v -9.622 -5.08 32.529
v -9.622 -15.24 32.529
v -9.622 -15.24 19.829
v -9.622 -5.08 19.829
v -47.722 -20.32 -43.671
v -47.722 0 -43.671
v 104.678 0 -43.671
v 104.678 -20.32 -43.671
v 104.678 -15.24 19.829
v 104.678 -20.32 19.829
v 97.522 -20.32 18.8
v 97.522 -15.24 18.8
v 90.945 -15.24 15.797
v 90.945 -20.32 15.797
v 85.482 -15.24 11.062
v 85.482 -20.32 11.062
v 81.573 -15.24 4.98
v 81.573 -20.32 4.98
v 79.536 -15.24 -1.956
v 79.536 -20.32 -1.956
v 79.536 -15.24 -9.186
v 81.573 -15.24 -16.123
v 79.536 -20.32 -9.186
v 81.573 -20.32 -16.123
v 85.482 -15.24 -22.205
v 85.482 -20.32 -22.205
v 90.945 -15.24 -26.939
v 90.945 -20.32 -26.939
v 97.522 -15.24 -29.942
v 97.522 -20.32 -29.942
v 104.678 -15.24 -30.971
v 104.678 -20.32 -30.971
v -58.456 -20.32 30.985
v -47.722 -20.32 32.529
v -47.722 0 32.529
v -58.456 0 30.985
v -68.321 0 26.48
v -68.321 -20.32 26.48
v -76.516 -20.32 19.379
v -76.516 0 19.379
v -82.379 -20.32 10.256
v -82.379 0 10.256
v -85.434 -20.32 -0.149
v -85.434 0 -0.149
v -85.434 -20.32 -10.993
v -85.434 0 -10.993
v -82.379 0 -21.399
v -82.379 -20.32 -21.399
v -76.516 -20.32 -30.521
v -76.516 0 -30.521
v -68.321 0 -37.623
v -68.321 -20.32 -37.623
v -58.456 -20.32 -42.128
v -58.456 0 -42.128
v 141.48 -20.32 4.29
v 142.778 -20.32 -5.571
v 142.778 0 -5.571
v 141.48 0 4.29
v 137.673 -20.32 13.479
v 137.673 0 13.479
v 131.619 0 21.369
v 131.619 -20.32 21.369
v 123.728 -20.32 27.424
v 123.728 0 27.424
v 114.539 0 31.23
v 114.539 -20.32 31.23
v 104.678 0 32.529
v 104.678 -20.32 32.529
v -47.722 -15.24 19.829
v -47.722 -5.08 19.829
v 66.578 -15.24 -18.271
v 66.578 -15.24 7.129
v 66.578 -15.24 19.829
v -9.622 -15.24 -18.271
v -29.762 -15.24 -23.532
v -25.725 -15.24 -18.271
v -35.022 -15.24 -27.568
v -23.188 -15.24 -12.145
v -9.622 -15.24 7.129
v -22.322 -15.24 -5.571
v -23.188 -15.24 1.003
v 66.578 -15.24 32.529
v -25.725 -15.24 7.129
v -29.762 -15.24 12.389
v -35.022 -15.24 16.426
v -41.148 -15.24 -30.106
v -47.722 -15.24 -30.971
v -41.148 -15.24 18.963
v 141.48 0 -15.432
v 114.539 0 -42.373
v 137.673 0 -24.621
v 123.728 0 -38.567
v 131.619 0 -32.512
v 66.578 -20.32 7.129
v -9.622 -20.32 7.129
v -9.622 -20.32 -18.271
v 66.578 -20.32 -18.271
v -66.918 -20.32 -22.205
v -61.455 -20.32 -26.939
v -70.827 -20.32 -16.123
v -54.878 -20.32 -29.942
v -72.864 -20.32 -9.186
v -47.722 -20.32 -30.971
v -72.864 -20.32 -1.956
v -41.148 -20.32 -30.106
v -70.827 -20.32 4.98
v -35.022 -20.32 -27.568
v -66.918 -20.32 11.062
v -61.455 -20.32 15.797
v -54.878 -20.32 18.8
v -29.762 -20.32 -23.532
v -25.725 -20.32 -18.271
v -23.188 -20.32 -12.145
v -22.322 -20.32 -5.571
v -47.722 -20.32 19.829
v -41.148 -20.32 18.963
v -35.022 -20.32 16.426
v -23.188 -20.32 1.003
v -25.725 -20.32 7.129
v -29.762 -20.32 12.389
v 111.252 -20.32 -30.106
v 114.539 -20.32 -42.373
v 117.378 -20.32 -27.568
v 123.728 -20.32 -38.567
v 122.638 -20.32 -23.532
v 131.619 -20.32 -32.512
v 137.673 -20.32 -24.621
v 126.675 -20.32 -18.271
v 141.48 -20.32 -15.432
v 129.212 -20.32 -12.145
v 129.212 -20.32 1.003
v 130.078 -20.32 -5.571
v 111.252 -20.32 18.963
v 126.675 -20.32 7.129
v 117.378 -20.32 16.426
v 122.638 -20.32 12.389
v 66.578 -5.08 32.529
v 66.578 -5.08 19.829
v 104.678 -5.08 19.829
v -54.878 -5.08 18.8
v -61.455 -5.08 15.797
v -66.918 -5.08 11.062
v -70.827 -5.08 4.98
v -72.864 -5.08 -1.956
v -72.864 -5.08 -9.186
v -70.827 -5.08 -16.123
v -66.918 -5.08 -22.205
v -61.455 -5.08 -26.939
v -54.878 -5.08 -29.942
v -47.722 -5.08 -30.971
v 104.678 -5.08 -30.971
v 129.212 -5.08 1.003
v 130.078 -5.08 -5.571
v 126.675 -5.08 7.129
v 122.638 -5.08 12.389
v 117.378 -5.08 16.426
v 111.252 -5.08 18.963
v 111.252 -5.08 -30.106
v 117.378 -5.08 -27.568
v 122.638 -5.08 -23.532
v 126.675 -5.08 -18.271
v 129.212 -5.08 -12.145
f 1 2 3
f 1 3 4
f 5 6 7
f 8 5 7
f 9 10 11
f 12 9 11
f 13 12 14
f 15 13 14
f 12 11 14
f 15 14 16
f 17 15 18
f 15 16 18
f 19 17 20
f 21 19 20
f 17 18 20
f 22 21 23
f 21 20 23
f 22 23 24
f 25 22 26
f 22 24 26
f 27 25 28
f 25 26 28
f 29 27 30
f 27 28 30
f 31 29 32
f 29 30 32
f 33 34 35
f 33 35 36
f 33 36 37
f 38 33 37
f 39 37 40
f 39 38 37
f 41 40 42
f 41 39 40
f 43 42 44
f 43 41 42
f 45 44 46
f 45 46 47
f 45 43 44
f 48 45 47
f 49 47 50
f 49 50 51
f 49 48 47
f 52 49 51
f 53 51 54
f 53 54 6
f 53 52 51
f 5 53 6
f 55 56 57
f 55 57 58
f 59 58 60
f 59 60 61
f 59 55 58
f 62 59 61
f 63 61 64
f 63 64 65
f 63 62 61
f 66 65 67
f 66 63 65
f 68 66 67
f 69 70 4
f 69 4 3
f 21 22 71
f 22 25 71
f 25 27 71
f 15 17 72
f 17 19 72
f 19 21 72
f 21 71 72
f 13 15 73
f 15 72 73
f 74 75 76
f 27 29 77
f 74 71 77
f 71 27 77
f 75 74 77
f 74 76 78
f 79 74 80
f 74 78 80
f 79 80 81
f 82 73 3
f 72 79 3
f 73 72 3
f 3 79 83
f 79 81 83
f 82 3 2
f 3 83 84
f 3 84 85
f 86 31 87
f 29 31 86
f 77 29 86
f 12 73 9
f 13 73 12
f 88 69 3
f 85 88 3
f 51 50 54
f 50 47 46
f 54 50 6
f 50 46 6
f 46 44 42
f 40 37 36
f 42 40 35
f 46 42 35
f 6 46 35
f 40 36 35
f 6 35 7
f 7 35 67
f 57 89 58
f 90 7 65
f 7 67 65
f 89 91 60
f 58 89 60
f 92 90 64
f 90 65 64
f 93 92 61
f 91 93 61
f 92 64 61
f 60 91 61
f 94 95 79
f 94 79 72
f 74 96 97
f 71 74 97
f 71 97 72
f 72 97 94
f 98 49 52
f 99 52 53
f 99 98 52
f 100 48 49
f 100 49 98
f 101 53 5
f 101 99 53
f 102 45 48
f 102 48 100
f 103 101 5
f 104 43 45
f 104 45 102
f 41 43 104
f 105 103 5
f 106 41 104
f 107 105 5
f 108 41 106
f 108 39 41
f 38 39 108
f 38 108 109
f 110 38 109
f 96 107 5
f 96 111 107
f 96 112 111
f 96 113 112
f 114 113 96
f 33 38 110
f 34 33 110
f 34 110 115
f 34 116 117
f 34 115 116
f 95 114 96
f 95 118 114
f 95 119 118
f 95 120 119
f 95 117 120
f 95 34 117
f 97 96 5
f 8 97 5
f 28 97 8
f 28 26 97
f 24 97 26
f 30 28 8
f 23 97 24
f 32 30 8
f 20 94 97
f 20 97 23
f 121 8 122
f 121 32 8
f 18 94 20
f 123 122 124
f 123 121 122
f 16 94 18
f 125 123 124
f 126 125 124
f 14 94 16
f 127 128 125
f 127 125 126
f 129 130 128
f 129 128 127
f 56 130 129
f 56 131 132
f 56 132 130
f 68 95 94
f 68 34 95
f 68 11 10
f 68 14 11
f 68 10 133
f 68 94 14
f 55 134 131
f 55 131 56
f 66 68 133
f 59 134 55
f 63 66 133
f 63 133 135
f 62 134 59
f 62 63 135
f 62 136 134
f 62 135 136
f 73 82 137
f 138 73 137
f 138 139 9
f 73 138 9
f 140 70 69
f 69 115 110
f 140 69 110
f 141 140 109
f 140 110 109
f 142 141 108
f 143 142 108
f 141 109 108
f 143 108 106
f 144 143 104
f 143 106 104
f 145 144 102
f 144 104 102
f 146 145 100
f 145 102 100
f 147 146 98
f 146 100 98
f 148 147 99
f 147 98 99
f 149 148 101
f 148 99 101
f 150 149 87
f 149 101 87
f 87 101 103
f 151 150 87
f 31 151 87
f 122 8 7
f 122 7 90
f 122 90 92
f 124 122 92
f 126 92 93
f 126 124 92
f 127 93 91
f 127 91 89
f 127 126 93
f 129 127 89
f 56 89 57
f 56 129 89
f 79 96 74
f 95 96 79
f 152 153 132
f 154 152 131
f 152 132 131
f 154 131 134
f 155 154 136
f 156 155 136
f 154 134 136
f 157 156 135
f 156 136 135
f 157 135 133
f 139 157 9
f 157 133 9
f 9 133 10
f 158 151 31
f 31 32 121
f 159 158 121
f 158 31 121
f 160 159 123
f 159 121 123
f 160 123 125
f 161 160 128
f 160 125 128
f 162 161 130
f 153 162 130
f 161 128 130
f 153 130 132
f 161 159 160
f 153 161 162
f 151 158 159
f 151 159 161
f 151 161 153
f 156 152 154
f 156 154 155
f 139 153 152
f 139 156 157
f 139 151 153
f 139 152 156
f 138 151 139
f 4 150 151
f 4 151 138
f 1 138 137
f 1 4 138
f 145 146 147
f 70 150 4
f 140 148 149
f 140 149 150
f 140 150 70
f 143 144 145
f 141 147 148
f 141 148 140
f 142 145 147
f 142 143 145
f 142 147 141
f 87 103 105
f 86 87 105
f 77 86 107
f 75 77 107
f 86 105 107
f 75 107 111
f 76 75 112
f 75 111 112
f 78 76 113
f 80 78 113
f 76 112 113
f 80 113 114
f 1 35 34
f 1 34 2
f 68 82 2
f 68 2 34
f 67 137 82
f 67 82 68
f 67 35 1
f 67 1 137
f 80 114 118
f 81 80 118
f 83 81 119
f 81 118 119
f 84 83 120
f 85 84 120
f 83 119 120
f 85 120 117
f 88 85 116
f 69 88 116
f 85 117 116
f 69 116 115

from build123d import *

# Parameters (mm, degrees)
F0_W      = 152.4
F0_H      = 76.2
F1_DEPTH  = 20.32
F2_W      = 76.2
F2_H      = 10.16
F3_DEPTH  = 63.5
F5_W      = 10.16
F5_H      = 50.8
F6_DEPTH  = 152.4
F7_DEPTH  = 20.32
F9_DEPTH  = 15.24
F10_W     = 76.2
F10_H     = 25.4
F11_DEPTH = 5.08


with BuildPart() as f1:
    # F0 (on Front) → F1 (new body)
    with BuildSketch(Plane.XZ):
        with Locations((28.4777595112, -5.5712945759)):
            Rectangle(F0_W, F0_H)
    extrude(amount=F1_DEPTH)

    # F2 (on face) → F3 (cut)
    with BuildSketch(Plane.XY.offset(32.5287054241)):
        with Locations((28.4777595112, -10.16)):
            Rectangle(F2_W, F2_H)
    extrude(amount=-F3_DEPTH, mode=Mode.SUBTRACT)

    # F5 (on face) → F6 (cut)
    with BuildSketch(Plane(origin=(-47.7222404888, 0, 0), x_dir=(0, -1, 0), z_dir=(-1, 0, 0))):
        with Locations((10.16, -5.5712945759)):
            Rectangle(F5_W, F5_H)
    extrude(amount=-F6_DEPTH, mode=Mode.SUBTRACT)

    # F4 (on face) → F7 (join)
    with BuildSketch(Plane.XZ.offset(20.32)):
        with BuildLine():
            Line((-47.7222404888, -43.6712945759), (-47.7222404888, 32.5287054241))
            ThreePointArc((-47.7222404888, 32.5287054241), (-85.8222404888, -5.5712945759), (-47.7222404888, -43.6712945759))
        make_face()
        with BuildLine():
            ThreePointArc((142.7777595112, -5.5712945759), (131.6185278744, 21.3694737873), (104.6777595112, 32.5287054241))
            Line((104.6777595112, 32.5287054241), (104.6777595112, -43.6712945759))
            ThreePointArc((104.6777595112, -43.6712945759), (131.6185278744, -32.5120629391), (142.7777595112, -5.5712945759))
        make_face()
    extrude(amount=-F7_DEPTH)

    # F8 (on face) → F9 (cut)
    with BuildSketch(Plane.XZ.offset(20.32)):
        with BuildLine():
            Line((-47.7222404888, -30.9712945759), (-47.7222404888, 19.8287054241))
            ThreePointArc((-47.7222404888, 19.8287054241), (-73.1222404888, -5.5712945759), (-47.7222404888, -30.9712945759))
        make_face()
        with BuildLine():
            ThreePointArc((-22.3222404888, -5.5712945759), (-29.7617282466, 12.3892176662), (-47.7222404888, 19.8287054241))
            Line((-47.7222404888, 19.8287054241), (-47.7222404888, -30.9712945759))
            ThreePointArc((-47.7222404888, -30.9712945759), (-29.7617282466, -23.5318068181), (-22.3222404888, -5.5712945759))
        make_face()
        with BuildLine():
            Line((104.6777595112, -30.9712945759), (104.6777595112, 19.8287054241))
            ThreePointArc((104.6777595112, 19.8287054241), (79.2777595112, -5.5712945759), (104.6777595112, -30.9712945759))
        make_face()
        with BuildLine():
            ThreePointArc((130.0777595112, -5.5712945759), (122.6382717534, 12.3892176662), (104.6777595112, 19.8287054241))
            Line((104.6777595112, 19.8287054241), (104.6777595112, -30.9712945759))
            ThreePointArc((104.6777595112, -30.9712945759), (122.6382717534, -23.5318068181), (130.0777595112, -5.5712945759))
        make_face()
    extrude(amount=-F9_DEPTH, mode=Mode.SUBTRACT)

    # F10 (on face) → F11 (cut)
    with BuildSketch(Plane.XZ.offset(20.32)):
        with Locations((28.4777595112, -5.5712945759)):
            Rectangle(F10_W, F10_H)
    extrude(amount=-F11_DEPTH, mode=Mode.SUBTRACT)


solid = f1.part
